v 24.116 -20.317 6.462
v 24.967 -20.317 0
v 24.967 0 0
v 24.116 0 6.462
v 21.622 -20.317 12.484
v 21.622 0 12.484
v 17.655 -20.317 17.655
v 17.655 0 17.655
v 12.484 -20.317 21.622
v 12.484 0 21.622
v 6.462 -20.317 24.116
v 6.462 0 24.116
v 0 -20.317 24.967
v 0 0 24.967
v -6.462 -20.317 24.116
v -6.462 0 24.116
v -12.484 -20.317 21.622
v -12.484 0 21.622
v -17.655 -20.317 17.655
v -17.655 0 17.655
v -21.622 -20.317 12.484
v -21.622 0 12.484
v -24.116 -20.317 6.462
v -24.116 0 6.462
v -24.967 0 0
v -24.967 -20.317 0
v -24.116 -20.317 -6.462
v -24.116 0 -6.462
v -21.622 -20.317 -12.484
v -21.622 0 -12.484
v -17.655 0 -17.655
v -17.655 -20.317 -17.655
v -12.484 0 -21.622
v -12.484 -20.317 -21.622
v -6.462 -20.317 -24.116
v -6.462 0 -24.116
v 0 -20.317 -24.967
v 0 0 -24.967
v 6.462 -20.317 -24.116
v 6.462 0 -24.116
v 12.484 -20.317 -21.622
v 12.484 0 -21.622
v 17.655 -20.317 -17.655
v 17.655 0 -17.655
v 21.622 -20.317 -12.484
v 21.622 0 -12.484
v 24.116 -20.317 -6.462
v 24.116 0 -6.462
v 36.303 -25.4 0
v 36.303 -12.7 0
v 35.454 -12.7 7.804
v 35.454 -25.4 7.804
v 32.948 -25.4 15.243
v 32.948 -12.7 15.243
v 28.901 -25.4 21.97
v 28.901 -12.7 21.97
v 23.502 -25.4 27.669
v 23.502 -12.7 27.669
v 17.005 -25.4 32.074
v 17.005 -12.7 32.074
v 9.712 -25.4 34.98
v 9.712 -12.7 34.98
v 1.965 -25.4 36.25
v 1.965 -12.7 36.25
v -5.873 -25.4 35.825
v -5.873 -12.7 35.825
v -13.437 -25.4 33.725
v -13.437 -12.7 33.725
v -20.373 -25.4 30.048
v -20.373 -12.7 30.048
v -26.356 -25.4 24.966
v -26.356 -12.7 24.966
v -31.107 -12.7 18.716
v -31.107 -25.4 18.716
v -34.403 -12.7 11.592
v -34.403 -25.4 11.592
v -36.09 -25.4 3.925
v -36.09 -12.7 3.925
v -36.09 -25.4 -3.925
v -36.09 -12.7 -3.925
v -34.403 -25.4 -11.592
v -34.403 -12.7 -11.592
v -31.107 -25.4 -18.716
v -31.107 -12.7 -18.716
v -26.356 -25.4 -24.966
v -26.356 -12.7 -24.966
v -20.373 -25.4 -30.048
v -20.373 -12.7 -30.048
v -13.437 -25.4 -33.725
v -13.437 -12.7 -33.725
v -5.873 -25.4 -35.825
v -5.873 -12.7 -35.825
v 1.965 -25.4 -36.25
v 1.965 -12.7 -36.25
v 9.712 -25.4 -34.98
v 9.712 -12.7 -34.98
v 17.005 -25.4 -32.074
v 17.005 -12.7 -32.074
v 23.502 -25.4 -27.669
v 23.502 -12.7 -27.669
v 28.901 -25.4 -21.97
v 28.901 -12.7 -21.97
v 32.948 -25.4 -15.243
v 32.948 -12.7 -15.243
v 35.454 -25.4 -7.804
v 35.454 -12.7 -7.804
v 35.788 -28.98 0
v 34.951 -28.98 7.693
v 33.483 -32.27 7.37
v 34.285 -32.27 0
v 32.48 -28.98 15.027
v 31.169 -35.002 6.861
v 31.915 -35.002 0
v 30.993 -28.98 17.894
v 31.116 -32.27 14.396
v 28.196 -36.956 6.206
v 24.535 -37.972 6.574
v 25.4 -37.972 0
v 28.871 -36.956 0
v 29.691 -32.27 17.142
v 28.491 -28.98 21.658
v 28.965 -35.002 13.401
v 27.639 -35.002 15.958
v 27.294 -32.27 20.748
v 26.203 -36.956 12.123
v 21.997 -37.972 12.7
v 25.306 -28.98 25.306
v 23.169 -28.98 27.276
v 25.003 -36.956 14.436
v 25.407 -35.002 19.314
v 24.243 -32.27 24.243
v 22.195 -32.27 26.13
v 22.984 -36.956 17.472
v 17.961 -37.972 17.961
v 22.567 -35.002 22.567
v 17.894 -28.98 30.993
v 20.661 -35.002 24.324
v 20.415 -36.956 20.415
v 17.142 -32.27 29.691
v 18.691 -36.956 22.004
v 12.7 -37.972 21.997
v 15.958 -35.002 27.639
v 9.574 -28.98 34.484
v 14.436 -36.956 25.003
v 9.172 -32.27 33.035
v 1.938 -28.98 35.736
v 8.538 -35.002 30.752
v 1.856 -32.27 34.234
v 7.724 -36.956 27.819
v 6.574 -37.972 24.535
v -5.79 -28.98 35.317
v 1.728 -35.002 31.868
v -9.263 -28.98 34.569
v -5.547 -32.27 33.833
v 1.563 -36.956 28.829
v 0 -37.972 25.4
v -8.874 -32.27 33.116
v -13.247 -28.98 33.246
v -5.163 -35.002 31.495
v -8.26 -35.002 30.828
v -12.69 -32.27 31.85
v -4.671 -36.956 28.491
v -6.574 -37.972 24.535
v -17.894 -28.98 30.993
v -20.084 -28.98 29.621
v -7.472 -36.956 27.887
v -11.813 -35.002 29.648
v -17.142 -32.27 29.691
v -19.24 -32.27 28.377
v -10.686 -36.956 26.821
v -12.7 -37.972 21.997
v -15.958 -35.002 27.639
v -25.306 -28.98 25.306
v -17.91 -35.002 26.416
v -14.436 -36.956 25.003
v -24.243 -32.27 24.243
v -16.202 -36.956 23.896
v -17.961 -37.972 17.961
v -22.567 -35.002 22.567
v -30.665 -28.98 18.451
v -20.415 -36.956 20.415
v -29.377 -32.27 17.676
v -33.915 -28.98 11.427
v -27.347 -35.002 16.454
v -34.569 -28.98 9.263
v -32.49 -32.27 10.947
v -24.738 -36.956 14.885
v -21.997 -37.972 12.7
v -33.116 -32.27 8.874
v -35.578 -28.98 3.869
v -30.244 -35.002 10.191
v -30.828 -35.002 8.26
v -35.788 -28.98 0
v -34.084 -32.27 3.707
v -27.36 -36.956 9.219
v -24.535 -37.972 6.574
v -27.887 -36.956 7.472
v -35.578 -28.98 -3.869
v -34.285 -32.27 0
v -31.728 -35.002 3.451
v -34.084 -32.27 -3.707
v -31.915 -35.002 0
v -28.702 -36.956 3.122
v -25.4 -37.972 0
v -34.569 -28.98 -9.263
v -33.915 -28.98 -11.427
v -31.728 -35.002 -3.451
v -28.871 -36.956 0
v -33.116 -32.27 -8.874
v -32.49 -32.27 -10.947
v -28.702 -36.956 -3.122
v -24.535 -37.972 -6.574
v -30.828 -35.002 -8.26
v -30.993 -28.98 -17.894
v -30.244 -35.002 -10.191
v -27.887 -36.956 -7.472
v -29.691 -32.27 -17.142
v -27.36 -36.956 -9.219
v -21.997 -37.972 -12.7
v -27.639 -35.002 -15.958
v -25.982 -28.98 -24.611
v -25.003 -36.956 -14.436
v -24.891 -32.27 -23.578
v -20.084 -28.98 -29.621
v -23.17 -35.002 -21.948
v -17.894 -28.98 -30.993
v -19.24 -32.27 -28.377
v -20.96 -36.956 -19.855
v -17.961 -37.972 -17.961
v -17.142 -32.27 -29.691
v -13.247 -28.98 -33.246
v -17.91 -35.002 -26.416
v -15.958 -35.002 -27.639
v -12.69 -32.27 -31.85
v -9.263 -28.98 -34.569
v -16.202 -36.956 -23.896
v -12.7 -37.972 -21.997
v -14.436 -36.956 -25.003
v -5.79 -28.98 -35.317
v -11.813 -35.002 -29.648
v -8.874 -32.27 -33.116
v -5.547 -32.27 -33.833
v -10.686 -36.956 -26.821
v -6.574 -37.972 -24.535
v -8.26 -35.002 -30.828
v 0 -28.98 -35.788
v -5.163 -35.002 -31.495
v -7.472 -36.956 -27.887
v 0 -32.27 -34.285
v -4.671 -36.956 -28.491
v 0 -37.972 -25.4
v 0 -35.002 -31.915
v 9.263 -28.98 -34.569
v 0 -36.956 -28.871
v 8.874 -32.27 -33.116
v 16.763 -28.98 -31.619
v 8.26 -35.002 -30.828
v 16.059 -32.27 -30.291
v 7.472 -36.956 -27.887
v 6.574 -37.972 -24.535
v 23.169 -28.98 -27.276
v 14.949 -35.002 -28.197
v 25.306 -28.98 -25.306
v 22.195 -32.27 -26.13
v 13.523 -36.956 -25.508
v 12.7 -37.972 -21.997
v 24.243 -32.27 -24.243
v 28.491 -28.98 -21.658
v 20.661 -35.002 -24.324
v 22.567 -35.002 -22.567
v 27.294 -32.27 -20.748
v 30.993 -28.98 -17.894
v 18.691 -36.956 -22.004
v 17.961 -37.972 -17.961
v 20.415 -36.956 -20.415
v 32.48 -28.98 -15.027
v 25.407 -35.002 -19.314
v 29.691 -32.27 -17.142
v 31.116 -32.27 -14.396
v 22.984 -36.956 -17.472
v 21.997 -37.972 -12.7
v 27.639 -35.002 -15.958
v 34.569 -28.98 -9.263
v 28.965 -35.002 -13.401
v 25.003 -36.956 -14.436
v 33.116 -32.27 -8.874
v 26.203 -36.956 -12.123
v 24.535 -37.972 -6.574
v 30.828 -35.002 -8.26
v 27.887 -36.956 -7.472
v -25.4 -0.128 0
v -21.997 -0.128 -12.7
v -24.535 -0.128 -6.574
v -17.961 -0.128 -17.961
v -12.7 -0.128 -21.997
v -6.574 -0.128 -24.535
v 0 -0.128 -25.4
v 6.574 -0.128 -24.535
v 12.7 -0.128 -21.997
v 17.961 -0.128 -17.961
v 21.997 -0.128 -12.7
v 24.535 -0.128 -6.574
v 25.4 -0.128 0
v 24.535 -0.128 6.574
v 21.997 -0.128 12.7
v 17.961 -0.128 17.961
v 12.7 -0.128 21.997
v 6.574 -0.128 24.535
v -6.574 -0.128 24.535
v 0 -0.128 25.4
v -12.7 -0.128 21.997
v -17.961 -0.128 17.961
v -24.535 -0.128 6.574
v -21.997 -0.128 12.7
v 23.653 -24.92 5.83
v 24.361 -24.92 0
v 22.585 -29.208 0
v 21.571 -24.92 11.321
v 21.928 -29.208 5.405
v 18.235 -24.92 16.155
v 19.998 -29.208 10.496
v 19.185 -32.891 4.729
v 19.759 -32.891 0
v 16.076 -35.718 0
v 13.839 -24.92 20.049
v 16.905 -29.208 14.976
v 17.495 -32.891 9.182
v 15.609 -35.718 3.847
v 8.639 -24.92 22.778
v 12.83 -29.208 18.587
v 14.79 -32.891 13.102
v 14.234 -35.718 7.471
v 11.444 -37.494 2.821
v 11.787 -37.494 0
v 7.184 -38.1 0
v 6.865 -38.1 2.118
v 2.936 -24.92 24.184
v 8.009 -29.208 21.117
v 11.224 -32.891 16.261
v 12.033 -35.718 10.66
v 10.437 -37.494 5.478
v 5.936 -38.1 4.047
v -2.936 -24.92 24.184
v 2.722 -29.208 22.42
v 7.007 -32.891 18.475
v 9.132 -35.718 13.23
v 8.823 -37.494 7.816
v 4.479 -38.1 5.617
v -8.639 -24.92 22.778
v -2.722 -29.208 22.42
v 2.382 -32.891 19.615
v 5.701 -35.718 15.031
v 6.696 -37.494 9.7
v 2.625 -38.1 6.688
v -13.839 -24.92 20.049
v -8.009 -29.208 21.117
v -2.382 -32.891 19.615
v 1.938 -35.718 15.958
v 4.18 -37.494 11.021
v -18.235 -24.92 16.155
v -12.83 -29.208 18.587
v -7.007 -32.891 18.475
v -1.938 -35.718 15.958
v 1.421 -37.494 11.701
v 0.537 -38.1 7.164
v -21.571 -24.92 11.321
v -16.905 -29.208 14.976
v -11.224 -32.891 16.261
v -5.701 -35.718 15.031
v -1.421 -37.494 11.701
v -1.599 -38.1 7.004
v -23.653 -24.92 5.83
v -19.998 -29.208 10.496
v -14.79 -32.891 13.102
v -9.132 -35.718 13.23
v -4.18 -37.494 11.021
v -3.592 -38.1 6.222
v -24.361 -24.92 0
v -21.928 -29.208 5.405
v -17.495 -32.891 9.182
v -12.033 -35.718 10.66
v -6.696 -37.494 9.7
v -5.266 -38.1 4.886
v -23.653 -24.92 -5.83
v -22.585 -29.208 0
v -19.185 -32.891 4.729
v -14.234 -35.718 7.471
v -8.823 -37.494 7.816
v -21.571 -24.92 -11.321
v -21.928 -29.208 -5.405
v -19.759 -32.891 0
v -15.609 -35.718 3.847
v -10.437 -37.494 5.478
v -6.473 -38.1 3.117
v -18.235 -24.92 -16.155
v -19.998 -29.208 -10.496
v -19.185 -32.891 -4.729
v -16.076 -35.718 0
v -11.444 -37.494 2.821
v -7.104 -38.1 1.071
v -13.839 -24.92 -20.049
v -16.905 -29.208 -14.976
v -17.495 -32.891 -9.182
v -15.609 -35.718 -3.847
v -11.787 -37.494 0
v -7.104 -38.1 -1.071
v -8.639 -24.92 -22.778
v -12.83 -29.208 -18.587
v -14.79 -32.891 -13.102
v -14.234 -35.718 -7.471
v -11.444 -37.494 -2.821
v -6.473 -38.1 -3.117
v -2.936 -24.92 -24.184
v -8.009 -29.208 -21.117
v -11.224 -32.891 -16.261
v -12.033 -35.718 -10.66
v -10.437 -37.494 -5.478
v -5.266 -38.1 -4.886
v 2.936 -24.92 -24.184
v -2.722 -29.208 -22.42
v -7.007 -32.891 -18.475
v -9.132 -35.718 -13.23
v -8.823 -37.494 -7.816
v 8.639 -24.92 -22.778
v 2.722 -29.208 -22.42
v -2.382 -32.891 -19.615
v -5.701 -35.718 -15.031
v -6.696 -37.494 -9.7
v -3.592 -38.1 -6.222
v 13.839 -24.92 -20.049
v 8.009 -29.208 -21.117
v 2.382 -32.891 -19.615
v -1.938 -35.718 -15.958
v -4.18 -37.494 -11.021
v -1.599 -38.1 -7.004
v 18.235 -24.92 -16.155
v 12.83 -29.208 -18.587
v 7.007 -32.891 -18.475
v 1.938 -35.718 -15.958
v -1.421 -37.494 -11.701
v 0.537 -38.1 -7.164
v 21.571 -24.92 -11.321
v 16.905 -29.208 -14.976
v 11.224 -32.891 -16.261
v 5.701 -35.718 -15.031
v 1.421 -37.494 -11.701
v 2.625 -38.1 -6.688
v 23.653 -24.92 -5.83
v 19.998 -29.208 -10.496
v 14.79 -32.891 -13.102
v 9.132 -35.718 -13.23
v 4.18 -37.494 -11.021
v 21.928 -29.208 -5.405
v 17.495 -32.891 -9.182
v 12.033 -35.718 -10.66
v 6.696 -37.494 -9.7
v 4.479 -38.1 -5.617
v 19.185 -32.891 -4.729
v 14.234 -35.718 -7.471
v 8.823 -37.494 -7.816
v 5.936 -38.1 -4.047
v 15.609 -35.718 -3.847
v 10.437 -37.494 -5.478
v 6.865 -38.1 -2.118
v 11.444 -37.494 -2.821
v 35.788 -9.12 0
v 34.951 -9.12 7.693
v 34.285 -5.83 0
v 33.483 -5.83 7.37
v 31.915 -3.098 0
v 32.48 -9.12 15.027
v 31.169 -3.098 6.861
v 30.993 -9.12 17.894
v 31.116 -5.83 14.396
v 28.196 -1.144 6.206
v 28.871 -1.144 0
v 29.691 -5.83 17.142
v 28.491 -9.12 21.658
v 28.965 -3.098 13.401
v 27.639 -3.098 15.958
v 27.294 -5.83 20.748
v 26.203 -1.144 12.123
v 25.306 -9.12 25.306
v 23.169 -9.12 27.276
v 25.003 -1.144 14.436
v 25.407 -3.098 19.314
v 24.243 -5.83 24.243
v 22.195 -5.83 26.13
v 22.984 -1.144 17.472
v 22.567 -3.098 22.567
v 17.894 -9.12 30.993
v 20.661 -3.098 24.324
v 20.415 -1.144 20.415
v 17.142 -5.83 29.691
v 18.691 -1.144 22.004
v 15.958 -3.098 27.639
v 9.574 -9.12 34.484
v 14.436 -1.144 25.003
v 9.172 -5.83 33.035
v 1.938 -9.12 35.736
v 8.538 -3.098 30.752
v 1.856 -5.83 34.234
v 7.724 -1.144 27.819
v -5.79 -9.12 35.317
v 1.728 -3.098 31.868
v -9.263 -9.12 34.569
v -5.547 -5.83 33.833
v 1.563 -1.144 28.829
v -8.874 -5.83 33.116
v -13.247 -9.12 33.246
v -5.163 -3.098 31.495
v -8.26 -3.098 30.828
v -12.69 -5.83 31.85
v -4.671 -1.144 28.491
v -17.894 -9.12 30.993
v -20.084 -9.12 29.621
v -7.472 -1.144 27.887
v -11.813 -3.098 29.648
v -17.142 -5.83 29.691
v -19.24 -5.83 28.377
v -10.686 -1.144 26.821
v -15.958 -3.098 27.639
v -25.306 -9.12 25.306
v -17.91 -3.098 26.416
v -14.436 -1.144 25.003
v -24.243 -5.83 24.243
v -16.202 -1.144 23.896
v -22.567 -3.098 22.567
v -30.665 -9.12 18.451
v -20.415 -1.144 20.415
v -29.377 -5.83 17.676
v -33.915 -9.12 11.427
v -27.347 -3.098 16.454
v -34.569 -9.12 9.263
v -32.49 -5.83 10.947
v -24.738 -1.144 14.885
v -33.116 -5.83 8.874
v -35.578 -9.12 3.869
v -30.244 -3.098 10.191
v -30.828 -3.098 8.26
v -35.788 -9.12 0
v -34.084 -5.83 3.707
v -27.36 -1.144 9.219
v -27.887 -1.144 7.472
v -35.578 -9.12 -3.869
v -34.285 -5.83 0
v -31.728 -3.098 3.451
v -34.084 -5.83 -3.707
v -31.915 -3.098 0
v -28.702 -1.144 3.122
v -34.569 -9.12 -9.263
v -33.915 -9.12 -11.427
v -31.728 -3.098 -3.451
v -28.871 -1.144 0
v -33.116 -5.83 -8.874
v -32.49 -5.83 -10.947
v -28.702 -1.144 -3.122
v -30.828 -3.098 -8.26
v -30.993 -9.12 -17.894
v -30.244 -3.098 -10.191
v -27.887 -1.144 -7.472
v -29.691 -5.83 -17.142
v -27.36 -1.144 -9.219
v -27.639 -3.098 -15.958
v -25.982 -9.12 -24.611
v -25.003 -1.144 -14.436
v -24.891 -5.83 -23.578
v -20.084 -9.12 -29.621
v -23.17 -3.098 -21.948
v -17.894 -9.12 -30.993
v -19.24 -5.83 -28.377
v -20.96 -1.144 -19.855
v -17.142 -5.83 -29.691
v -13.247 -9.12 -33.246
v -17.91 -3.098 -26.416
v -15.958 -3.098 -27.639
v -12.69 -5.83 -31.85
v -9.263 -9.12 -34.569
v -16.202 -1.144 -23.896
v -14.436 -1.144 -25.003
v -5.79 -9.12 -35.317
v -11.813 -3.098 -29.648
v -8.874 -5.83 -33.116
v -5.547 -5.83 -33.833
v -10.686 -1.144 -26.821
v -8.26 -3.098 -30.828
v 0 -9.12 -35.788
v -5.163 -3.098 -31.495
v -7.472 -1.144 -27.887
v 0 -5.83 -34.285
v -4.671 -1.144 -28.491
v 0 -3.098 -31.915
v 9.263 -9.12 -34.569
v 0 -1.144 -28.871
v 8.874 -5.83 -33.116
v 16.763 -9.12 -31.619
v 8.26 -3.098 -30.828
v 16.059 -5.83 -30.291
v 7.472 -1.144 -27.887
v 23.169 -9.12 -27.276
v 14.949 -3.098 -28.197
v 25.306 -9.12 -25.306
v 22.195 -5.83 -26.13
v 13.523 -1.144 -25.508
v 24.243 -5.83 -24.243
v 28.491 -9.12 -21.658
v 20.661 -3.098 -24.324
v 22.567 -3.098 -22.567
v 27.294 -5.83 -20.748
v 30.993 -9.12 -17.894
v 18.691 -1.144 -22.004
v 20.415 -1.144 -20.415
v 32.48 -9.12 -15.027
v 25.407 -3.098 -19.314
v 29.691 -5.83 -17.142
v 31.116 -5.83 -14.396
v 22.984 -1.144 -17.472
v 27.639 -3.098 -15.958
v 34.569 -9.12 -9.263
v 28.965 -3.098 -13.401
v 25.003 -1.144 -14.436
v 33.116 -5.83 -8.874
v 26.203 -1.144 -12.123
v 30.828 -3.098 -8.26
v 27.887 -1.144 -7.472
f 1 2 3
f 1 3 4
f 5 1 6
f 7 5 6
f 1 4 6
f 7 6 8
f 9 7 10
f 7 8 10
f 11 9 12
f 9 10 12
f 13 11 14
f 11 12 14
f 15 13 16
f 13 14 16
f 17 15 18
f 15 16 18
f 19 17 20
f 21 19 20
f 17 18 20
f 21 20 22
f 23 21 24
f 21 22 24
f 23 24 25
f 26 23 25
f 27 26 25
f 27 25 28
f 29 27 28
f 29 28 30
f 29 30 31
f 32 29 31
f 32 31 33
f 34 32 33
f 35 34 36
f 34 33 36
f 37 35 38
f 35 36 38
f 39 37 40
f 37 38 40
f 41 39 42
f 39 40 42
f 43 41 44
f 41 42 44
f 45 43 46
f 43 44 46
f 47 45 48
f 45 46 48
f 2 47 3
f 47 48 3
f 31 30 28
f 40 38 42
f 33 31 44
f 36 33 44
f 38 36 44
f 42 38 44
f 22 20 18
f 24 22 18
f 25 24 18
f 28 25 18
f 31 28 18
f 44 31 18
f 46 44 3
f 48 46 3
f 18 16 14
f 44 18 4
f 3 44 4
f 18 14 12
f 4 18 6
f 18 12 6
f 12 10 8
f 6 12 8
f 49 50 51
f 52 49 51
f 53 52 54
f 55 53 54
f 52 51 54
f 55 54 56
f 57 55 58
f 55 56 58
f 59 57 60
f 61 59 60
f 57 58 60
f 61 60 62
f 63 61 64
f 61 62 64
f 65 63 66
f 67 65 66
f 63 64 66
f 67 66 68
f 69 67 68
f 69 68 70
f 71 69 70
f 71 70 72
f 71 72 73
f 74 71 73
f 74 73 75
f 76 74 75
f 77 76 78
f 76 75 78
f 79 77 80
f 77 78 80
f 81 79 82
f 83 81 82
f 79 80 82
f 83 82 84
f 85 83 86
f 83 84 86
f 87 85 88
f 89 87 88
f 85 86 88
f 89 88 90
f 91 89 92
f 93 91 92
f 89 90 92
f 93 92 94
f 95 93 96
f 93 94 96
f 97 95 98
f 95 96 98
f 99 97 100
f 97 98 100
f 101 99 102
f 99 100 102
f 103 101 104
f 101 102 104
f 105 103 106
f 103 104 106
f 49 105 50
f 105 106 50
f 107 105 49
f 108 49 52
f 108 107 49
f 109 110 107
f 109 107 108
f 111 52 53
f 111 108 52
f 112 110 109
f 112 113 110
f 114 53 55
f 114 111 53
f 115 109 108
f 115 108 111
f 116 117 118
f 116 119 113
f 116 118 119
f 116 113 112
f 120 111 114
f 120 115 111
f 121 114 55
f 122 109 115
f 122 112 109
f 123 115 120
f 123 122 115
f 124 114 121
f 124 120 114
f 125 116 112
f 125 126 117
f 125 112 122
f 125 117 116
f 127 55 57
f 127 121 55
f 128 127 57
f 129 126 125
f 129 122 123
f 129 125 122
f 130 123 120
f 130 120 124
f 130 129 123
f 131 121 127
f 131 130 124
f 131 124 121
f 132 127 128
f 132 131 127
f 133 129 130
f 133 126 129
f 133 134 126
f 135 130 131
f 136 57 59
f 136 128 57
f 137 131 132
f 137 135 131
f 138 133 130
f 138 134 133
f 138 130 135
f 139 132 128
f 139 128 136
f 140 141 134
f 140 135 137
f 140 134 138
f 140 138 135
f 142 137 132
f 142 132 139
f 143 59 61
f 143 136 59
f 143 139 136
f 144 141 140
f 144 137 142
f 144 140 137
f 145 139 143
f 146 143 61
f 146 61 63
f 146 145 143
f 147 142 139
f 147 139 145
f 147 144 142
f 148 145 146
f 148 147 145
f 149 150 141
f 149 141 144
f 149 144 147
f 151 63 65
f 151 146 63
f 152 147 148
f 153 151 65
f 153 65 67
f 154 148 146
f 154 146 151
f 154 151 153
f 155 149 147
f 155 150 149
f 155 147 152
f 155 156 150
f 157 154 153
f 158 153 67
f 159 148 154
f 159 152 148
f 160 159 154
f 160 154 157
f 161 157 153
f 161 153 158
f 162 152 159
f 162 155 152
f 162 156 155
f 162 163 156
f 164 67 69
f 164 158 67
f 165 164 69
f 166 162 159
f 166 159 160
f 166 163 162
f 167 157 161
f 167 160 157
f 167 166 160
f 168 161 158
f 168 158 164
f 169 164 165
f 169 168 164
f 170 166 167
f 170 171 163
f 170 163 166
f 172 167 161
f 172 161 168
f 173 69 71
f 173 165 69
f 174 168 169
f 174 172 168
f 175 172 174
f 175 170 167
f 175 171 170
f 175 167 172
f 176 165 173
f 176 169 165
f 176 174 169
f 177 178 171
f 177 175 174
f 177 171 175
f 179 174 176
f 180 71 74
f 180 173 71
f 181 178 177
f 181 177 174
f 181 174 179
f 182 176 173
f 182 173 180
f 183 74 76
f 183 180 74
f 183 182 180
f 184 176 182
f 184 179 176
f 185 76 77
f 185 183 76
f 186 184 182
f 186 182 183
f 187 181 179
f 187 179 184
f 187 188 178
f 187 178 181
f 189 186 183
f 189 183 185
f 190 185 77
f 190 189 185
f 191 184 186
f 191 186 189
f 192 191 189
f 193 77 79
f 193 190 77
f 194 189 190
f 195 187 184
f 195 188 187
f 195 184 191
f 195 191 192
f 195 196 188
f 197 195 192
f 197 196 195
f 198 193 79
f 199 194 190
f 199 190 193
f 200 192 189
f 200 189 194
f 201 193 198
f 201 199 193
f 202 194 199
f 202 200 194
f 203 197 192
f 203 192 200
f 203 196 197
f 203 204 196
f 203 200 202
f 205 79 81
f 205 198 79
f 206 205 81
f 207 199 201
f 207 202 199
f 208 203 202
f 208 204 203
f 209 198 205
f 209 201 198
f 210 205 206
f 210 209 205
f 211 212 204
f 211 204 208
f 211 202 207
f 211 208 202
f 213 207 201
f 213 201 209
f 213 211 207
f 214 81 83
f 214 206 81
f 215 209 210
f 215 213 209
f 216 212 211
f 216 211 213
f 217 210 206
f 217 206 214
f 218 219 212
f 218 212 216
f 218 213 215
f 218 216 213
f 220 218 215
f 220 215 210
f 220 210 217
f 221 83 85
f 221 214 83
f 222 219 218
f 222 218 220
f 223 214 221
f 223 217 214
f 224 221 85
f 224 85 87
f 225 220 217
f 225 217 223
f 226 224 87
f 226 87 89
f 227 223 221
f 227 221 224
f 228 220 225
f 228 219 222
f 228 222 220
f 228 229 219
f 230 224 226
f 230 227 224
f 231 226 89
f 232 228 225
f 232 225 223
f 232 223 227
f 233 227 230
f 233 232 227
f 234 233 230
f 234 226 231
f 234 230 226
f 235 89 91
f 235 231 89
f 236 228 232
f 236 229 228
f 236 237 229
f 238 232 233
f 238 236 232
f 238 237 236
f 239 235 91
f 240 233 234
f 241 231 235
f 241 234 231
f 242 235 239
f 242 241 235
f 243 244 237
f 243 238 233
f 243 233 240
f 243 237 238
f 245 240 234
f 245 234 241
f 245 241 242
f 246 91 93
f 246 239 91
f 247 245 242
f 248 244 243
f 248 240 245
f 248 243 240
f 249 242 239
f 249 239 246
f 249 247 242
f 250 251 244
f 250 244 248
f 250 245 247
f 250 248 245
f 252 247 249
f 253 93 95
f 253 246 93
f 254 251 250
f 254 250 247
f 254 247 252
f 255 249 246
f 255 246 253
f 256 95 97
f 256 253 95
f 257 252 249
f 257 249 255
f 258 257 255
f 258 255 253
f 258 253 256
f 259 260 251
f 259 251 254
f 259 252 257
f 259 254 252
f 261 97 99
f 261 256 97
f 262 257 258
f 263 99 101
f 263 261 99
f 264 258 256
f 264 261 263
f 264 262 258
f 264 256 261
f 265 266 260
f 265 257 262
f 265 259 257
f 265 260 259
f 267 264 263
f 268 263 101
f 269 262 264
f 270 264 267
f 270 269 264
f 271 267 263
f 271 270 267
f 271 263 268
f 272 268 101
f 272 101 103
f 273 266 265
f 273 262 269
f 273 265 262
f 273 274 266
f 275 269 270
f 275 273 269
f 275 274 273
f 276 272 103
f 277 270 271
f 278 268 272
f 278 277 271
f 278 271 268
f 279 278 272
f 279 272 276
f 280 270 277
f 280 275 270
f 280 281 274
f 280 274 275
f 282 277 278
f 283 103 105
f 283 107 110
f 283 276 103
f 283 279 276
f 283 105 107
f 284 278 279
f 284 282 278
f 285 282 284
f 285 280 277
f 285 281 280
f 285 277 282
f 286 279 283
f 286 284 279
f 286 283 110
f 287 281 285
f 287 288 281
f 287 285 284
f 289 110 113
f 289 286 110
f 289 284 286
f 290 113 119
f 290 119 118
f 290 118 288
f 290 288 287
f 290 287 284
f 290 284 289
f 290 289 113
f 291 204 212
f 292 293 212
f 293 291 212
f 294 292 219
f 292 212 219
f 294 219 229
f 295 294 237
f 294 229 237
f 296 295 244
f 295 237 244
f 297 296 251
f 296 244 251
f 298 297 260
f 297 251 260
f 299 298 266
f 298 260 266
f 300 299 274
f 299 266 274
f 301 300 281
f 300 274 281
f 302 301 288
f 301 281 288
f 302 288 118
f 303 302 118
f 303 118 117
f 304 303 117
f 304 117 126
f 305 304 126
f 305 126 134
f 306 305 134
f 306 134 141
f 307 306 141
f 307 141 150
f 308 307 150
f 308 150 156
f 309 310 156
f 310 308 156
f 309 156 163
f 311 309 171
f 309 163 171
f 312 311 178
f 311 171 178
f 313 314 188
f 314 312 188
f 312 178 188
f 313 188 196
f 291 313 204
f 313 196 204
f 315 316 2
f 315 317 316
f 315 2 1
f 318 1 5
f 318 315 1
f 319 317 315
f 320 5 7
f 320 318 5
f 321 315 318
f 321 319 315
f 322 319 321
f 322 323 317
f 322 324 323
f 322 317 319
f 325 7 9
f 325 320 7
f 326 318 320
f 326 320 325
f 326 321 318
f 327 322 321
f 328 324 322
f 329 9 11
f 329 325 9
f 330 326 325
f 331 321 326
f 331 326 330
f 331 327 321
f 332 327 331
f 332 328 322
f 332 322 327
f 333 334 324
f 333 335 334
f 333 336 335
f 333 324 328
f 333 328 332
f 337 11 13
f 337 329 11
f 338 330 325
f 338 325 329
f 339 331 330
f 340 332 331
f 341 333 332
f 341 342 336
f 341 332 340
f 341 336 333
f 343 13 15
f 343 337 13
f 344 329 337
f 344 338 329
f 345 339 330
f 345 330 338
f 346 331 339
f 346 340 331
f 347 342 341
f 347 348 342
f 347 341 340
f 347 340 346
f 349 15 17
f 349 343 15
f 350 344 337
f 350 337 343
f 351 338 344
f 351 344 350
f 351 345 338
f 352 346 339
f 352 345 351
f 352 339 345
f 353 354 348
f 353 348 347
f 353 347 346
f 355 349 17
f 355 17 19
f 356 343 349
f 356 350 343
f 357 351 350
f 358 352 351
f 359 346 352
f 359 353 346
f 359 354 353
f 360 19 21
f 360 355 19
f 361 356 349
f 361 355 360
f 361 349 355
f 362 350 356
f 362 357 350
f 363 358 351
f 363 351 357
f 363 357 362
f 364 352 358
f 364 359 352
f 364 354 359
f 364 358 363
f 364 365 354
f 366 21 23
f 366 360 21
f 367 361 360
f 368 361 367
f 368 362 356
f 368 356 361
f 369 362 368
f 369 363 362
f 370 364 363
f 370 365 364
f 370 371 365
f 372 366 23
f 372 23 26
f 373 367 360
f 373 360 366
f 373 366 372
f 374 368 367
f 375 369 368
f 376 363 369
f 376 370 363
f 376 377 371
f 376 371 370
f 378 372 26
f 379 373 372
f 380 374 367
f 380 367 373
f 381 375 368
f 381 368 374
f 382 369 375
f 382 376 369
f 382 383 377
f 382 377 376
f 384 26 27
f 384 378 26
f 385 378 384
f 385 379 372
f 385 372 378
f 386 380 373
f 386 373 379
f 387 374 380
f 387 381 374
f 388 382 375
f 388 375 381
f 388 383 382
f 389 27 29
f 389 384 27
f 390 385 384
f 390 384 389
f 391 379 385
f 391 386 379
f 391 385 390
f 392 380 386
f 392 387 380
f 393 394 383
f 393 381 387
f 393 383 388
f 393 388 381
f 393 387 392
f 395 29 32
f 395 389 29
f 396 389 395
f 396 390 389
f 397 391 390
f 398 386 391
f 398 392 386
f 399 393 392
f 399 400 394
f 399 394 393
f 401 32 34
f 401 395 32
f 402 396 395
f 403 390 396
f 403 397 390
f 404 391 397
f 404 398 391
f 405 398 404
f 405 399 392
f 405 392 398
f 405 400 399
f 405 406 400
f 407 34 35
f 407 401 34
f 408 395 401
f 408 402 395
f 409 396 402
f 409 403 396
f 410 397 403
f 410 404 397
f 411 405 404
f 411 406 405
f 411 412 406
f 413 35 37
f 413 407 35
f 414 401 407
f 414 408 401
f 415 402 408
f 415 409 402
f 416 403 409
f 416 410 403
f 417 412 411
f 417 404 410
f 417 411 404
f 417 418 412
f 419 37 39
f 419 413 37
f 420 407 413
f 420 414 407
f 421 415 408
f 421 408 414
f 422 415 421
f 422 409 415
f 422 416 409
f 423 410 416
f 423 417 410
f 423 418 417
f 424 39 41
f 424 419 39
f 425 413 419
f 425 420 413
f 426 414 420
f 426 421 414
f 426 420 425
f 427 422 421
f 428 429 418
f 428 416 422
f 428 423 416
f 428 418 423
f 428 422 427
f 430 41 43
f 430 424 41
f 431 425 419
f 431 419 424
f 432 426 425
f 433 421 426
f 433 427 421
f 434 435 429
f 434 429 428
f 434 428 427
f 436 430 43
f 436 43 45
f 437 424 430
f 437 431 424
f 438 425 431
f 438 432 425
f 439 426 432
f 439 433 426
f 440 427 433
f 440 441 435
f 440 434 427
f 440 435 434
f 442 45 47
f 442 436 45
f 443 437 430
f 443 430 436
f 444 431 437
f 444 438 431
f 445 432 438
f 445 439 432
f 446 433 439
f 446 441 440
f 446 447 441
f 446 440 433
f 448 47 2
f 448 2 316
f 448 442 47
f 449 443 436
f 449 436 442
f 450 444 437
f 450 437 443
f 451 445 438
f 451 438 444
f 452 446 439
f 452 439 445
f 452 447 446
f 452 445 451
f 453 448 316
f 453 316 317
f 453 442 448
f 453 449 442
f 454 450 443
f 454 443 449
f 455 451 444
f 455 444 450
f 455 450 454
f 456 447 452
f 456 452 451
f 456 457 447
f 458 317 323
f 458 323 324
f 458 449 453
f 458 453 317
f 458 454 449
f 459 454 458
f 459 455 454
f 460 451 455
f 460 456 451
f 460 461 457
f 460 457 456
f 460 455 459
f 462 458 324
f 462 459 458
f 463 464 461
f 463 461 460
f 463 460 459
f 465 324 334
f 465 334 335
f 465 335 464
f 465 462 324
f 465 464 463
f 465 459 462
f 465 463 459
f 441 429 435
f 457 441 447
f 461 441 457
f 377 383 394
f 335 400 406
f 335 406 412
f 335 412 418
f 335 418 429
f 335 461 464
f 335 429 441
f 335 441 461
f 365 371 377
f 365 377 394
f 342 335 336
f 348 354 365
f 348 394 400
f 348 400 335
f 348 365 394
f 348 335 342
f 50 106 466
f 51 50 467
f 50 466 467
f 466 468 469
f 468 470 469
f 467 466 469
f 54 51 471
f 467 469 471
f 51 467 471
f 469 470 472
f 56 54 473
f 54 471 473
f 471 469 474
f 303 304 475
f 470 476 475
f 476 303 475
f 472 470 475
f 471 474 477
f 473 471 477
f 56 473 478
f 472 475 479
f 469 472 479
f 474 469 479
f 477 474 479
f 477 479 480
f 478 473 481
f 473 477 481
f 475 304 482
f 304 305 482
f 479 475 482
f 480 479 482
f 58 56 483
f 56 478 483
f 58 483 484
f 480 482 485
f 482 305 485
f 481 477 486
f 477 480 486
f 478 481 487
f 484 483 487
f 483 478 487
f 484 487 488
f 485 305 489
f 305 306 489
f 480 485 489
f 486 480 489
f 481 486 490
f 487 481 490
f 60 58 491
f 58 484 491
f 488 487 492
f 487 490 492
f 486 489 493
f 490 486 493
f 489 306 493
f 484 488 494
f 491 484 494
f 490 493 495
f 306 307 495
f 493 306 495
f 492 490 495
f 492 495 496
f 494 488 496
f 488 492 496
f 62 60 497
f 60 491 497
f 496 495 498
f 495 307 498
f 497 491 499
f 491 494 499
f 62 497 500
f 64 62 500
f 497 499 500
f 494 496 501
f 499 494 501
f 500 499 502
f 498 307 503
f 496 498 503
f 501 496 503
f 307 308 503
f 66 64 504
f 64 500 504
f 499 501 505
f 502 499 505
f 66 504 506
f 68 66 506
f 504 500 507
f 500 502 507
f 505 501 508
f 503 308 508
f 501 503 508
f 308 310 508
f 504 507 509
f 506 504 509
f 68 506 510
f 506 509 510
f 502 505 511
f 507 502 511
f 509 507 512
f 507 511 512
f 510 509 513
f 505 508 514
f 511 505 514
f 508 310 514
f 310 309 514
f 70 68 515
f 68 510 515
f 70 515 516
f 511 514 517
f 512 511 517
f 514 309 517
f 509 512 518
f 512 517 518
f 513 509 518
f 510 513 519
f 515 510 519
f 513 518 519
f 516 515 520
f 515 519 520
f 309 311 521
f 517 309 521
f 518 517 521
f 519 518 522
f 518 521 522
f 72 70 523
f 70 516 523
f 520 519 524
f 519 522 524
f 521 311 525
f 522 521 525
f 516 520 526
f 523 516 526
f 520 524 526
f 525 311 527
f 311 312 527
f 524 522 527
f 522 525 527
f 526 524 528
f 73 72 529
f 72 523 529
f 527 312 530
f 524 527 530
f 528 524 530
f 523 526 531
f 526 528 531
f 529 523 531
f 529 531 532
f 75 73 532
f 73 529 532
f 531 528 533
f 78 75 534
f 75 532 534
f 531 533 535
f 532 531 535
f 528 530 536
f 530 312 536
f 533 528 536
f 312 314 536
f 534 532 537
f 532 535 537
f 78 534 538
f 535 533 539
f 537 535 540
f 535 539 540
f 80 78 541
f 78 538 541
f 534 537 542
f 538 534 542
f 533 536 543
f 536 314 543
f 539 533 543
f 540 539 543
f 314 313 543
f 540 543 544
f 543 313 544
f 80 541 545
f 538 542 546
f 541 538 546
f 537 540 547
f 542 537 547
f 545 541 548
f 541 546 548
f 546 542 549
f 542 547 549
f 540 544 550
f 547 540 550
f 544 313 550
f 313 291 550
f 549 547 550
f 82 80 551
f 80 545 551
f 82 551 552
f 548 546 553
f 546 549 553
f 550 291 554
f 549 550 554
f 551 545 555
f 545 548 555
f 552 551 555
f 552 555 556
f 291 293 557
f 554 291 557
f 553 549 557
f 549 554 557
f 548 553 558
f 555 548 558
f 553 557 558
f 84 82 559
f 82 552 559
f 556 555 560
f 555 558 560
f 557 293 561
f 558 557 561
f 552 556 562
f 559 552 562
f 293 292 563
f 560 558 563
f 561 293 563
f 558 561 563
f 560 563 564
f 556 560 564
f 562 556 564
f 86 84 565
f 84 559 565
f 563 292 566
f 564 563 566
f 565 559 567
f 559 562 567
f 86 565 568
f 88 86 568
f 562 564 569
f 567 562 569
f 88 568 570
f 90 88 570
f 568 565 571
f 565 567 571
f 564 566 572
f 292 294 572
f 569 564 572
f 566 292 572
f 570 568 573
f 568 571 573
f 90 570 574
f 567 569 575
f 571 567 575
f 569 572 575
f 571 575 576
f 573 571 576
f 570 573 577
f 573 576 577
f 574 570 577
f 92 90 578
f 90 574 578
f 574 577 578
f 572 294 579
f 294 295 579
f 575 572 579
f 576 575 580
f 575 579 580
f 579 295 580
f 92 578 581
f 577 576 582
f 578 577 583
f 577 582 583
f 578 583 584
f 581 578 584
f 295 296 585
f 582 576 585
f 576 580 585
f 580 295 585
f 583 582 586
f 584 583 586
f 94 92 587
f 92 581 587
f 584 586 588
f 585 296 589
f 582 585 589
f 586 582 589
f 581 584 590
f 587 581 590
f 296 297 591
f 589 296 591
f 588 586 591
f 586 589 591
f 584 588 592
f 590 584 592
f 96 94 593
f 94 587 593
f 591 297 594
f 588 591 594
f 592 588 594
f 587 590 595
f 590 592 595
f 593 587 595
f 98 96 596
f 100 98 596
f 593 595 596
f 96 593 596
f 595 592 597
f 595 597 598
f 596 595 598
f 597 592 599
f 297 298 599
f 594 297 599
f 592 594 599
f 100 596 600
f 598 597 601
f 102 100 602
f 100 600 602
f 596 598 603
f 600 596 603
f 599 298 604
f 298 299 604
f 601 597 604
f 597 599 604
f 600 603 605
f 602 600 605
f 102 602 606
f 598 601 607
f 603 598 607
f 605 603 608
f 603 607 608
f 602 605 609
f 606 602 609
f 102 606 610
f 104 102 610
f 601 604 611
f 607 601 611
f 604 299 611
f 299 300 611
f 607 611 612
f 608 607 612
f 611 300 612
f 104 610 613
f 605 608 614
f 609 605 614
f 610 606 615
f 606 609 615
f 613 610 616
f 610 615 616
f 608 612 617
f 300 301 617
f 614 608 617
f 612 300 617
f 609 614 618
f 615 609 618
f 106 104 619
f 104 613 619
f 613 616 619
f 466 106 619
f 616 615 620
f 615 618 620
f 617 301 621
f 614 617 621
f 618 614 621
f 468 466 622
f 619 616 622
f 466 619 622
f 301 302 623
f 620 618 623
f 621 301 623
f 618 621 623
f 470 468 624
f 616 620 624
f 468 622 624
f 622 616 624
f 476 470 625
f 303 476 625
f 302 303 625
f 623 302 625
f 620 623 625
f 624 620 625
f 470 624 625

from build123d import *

# Parameters (mm, degrees)
F0_R     = 36.303067
F1_DEPTH = 38.1
F2_R     = 12.7
F3_D     = 50.8
F3_DEPTH = 76.2
F4_R     = 24.967235
F5_DEPTH = 38.1
F6_R     = 17.783097


with BuildPart() as f1:
    # F0 (on Front) → F1 (new body)
    with BuildSketch(Plane.XZ):
        Circle(F0_R)
    extrude(amount=F1_DEPTH)

    # F2
    f2_edges = [f1.edges().sort_by_distance(p)[0] for p in [
        (-36.303067, -38.1, 0),
        (-36.303067, 0, 0),
    ]]
    fillet(f2_edges, radius=F2_R)

    # F3
    with Locations(Plane(origin=(0, 0, 0), x_dir=(1, 0, 0), z_dir=(0, 1, 0))):
        with Locations((0, 0)):
            Hole(F3_D / 2, depth=F3_DEPTH)


with BuildPart() as f5:
    # F4 (on face) → F5 (new body)
    with BuildSketch(Plane.XZ):
        Circle(F4_R)
    extrude(amount=F5_DEPTH)

    # F6
    f6_edges = [f5.edges().sort_by_distance(p)[0] for p in [
        (-24.967235, -38.1, 0),
    ]]
    fillet(f6_edges, radius=F6_R)


solid = Compound([f1.part, f5.part])
